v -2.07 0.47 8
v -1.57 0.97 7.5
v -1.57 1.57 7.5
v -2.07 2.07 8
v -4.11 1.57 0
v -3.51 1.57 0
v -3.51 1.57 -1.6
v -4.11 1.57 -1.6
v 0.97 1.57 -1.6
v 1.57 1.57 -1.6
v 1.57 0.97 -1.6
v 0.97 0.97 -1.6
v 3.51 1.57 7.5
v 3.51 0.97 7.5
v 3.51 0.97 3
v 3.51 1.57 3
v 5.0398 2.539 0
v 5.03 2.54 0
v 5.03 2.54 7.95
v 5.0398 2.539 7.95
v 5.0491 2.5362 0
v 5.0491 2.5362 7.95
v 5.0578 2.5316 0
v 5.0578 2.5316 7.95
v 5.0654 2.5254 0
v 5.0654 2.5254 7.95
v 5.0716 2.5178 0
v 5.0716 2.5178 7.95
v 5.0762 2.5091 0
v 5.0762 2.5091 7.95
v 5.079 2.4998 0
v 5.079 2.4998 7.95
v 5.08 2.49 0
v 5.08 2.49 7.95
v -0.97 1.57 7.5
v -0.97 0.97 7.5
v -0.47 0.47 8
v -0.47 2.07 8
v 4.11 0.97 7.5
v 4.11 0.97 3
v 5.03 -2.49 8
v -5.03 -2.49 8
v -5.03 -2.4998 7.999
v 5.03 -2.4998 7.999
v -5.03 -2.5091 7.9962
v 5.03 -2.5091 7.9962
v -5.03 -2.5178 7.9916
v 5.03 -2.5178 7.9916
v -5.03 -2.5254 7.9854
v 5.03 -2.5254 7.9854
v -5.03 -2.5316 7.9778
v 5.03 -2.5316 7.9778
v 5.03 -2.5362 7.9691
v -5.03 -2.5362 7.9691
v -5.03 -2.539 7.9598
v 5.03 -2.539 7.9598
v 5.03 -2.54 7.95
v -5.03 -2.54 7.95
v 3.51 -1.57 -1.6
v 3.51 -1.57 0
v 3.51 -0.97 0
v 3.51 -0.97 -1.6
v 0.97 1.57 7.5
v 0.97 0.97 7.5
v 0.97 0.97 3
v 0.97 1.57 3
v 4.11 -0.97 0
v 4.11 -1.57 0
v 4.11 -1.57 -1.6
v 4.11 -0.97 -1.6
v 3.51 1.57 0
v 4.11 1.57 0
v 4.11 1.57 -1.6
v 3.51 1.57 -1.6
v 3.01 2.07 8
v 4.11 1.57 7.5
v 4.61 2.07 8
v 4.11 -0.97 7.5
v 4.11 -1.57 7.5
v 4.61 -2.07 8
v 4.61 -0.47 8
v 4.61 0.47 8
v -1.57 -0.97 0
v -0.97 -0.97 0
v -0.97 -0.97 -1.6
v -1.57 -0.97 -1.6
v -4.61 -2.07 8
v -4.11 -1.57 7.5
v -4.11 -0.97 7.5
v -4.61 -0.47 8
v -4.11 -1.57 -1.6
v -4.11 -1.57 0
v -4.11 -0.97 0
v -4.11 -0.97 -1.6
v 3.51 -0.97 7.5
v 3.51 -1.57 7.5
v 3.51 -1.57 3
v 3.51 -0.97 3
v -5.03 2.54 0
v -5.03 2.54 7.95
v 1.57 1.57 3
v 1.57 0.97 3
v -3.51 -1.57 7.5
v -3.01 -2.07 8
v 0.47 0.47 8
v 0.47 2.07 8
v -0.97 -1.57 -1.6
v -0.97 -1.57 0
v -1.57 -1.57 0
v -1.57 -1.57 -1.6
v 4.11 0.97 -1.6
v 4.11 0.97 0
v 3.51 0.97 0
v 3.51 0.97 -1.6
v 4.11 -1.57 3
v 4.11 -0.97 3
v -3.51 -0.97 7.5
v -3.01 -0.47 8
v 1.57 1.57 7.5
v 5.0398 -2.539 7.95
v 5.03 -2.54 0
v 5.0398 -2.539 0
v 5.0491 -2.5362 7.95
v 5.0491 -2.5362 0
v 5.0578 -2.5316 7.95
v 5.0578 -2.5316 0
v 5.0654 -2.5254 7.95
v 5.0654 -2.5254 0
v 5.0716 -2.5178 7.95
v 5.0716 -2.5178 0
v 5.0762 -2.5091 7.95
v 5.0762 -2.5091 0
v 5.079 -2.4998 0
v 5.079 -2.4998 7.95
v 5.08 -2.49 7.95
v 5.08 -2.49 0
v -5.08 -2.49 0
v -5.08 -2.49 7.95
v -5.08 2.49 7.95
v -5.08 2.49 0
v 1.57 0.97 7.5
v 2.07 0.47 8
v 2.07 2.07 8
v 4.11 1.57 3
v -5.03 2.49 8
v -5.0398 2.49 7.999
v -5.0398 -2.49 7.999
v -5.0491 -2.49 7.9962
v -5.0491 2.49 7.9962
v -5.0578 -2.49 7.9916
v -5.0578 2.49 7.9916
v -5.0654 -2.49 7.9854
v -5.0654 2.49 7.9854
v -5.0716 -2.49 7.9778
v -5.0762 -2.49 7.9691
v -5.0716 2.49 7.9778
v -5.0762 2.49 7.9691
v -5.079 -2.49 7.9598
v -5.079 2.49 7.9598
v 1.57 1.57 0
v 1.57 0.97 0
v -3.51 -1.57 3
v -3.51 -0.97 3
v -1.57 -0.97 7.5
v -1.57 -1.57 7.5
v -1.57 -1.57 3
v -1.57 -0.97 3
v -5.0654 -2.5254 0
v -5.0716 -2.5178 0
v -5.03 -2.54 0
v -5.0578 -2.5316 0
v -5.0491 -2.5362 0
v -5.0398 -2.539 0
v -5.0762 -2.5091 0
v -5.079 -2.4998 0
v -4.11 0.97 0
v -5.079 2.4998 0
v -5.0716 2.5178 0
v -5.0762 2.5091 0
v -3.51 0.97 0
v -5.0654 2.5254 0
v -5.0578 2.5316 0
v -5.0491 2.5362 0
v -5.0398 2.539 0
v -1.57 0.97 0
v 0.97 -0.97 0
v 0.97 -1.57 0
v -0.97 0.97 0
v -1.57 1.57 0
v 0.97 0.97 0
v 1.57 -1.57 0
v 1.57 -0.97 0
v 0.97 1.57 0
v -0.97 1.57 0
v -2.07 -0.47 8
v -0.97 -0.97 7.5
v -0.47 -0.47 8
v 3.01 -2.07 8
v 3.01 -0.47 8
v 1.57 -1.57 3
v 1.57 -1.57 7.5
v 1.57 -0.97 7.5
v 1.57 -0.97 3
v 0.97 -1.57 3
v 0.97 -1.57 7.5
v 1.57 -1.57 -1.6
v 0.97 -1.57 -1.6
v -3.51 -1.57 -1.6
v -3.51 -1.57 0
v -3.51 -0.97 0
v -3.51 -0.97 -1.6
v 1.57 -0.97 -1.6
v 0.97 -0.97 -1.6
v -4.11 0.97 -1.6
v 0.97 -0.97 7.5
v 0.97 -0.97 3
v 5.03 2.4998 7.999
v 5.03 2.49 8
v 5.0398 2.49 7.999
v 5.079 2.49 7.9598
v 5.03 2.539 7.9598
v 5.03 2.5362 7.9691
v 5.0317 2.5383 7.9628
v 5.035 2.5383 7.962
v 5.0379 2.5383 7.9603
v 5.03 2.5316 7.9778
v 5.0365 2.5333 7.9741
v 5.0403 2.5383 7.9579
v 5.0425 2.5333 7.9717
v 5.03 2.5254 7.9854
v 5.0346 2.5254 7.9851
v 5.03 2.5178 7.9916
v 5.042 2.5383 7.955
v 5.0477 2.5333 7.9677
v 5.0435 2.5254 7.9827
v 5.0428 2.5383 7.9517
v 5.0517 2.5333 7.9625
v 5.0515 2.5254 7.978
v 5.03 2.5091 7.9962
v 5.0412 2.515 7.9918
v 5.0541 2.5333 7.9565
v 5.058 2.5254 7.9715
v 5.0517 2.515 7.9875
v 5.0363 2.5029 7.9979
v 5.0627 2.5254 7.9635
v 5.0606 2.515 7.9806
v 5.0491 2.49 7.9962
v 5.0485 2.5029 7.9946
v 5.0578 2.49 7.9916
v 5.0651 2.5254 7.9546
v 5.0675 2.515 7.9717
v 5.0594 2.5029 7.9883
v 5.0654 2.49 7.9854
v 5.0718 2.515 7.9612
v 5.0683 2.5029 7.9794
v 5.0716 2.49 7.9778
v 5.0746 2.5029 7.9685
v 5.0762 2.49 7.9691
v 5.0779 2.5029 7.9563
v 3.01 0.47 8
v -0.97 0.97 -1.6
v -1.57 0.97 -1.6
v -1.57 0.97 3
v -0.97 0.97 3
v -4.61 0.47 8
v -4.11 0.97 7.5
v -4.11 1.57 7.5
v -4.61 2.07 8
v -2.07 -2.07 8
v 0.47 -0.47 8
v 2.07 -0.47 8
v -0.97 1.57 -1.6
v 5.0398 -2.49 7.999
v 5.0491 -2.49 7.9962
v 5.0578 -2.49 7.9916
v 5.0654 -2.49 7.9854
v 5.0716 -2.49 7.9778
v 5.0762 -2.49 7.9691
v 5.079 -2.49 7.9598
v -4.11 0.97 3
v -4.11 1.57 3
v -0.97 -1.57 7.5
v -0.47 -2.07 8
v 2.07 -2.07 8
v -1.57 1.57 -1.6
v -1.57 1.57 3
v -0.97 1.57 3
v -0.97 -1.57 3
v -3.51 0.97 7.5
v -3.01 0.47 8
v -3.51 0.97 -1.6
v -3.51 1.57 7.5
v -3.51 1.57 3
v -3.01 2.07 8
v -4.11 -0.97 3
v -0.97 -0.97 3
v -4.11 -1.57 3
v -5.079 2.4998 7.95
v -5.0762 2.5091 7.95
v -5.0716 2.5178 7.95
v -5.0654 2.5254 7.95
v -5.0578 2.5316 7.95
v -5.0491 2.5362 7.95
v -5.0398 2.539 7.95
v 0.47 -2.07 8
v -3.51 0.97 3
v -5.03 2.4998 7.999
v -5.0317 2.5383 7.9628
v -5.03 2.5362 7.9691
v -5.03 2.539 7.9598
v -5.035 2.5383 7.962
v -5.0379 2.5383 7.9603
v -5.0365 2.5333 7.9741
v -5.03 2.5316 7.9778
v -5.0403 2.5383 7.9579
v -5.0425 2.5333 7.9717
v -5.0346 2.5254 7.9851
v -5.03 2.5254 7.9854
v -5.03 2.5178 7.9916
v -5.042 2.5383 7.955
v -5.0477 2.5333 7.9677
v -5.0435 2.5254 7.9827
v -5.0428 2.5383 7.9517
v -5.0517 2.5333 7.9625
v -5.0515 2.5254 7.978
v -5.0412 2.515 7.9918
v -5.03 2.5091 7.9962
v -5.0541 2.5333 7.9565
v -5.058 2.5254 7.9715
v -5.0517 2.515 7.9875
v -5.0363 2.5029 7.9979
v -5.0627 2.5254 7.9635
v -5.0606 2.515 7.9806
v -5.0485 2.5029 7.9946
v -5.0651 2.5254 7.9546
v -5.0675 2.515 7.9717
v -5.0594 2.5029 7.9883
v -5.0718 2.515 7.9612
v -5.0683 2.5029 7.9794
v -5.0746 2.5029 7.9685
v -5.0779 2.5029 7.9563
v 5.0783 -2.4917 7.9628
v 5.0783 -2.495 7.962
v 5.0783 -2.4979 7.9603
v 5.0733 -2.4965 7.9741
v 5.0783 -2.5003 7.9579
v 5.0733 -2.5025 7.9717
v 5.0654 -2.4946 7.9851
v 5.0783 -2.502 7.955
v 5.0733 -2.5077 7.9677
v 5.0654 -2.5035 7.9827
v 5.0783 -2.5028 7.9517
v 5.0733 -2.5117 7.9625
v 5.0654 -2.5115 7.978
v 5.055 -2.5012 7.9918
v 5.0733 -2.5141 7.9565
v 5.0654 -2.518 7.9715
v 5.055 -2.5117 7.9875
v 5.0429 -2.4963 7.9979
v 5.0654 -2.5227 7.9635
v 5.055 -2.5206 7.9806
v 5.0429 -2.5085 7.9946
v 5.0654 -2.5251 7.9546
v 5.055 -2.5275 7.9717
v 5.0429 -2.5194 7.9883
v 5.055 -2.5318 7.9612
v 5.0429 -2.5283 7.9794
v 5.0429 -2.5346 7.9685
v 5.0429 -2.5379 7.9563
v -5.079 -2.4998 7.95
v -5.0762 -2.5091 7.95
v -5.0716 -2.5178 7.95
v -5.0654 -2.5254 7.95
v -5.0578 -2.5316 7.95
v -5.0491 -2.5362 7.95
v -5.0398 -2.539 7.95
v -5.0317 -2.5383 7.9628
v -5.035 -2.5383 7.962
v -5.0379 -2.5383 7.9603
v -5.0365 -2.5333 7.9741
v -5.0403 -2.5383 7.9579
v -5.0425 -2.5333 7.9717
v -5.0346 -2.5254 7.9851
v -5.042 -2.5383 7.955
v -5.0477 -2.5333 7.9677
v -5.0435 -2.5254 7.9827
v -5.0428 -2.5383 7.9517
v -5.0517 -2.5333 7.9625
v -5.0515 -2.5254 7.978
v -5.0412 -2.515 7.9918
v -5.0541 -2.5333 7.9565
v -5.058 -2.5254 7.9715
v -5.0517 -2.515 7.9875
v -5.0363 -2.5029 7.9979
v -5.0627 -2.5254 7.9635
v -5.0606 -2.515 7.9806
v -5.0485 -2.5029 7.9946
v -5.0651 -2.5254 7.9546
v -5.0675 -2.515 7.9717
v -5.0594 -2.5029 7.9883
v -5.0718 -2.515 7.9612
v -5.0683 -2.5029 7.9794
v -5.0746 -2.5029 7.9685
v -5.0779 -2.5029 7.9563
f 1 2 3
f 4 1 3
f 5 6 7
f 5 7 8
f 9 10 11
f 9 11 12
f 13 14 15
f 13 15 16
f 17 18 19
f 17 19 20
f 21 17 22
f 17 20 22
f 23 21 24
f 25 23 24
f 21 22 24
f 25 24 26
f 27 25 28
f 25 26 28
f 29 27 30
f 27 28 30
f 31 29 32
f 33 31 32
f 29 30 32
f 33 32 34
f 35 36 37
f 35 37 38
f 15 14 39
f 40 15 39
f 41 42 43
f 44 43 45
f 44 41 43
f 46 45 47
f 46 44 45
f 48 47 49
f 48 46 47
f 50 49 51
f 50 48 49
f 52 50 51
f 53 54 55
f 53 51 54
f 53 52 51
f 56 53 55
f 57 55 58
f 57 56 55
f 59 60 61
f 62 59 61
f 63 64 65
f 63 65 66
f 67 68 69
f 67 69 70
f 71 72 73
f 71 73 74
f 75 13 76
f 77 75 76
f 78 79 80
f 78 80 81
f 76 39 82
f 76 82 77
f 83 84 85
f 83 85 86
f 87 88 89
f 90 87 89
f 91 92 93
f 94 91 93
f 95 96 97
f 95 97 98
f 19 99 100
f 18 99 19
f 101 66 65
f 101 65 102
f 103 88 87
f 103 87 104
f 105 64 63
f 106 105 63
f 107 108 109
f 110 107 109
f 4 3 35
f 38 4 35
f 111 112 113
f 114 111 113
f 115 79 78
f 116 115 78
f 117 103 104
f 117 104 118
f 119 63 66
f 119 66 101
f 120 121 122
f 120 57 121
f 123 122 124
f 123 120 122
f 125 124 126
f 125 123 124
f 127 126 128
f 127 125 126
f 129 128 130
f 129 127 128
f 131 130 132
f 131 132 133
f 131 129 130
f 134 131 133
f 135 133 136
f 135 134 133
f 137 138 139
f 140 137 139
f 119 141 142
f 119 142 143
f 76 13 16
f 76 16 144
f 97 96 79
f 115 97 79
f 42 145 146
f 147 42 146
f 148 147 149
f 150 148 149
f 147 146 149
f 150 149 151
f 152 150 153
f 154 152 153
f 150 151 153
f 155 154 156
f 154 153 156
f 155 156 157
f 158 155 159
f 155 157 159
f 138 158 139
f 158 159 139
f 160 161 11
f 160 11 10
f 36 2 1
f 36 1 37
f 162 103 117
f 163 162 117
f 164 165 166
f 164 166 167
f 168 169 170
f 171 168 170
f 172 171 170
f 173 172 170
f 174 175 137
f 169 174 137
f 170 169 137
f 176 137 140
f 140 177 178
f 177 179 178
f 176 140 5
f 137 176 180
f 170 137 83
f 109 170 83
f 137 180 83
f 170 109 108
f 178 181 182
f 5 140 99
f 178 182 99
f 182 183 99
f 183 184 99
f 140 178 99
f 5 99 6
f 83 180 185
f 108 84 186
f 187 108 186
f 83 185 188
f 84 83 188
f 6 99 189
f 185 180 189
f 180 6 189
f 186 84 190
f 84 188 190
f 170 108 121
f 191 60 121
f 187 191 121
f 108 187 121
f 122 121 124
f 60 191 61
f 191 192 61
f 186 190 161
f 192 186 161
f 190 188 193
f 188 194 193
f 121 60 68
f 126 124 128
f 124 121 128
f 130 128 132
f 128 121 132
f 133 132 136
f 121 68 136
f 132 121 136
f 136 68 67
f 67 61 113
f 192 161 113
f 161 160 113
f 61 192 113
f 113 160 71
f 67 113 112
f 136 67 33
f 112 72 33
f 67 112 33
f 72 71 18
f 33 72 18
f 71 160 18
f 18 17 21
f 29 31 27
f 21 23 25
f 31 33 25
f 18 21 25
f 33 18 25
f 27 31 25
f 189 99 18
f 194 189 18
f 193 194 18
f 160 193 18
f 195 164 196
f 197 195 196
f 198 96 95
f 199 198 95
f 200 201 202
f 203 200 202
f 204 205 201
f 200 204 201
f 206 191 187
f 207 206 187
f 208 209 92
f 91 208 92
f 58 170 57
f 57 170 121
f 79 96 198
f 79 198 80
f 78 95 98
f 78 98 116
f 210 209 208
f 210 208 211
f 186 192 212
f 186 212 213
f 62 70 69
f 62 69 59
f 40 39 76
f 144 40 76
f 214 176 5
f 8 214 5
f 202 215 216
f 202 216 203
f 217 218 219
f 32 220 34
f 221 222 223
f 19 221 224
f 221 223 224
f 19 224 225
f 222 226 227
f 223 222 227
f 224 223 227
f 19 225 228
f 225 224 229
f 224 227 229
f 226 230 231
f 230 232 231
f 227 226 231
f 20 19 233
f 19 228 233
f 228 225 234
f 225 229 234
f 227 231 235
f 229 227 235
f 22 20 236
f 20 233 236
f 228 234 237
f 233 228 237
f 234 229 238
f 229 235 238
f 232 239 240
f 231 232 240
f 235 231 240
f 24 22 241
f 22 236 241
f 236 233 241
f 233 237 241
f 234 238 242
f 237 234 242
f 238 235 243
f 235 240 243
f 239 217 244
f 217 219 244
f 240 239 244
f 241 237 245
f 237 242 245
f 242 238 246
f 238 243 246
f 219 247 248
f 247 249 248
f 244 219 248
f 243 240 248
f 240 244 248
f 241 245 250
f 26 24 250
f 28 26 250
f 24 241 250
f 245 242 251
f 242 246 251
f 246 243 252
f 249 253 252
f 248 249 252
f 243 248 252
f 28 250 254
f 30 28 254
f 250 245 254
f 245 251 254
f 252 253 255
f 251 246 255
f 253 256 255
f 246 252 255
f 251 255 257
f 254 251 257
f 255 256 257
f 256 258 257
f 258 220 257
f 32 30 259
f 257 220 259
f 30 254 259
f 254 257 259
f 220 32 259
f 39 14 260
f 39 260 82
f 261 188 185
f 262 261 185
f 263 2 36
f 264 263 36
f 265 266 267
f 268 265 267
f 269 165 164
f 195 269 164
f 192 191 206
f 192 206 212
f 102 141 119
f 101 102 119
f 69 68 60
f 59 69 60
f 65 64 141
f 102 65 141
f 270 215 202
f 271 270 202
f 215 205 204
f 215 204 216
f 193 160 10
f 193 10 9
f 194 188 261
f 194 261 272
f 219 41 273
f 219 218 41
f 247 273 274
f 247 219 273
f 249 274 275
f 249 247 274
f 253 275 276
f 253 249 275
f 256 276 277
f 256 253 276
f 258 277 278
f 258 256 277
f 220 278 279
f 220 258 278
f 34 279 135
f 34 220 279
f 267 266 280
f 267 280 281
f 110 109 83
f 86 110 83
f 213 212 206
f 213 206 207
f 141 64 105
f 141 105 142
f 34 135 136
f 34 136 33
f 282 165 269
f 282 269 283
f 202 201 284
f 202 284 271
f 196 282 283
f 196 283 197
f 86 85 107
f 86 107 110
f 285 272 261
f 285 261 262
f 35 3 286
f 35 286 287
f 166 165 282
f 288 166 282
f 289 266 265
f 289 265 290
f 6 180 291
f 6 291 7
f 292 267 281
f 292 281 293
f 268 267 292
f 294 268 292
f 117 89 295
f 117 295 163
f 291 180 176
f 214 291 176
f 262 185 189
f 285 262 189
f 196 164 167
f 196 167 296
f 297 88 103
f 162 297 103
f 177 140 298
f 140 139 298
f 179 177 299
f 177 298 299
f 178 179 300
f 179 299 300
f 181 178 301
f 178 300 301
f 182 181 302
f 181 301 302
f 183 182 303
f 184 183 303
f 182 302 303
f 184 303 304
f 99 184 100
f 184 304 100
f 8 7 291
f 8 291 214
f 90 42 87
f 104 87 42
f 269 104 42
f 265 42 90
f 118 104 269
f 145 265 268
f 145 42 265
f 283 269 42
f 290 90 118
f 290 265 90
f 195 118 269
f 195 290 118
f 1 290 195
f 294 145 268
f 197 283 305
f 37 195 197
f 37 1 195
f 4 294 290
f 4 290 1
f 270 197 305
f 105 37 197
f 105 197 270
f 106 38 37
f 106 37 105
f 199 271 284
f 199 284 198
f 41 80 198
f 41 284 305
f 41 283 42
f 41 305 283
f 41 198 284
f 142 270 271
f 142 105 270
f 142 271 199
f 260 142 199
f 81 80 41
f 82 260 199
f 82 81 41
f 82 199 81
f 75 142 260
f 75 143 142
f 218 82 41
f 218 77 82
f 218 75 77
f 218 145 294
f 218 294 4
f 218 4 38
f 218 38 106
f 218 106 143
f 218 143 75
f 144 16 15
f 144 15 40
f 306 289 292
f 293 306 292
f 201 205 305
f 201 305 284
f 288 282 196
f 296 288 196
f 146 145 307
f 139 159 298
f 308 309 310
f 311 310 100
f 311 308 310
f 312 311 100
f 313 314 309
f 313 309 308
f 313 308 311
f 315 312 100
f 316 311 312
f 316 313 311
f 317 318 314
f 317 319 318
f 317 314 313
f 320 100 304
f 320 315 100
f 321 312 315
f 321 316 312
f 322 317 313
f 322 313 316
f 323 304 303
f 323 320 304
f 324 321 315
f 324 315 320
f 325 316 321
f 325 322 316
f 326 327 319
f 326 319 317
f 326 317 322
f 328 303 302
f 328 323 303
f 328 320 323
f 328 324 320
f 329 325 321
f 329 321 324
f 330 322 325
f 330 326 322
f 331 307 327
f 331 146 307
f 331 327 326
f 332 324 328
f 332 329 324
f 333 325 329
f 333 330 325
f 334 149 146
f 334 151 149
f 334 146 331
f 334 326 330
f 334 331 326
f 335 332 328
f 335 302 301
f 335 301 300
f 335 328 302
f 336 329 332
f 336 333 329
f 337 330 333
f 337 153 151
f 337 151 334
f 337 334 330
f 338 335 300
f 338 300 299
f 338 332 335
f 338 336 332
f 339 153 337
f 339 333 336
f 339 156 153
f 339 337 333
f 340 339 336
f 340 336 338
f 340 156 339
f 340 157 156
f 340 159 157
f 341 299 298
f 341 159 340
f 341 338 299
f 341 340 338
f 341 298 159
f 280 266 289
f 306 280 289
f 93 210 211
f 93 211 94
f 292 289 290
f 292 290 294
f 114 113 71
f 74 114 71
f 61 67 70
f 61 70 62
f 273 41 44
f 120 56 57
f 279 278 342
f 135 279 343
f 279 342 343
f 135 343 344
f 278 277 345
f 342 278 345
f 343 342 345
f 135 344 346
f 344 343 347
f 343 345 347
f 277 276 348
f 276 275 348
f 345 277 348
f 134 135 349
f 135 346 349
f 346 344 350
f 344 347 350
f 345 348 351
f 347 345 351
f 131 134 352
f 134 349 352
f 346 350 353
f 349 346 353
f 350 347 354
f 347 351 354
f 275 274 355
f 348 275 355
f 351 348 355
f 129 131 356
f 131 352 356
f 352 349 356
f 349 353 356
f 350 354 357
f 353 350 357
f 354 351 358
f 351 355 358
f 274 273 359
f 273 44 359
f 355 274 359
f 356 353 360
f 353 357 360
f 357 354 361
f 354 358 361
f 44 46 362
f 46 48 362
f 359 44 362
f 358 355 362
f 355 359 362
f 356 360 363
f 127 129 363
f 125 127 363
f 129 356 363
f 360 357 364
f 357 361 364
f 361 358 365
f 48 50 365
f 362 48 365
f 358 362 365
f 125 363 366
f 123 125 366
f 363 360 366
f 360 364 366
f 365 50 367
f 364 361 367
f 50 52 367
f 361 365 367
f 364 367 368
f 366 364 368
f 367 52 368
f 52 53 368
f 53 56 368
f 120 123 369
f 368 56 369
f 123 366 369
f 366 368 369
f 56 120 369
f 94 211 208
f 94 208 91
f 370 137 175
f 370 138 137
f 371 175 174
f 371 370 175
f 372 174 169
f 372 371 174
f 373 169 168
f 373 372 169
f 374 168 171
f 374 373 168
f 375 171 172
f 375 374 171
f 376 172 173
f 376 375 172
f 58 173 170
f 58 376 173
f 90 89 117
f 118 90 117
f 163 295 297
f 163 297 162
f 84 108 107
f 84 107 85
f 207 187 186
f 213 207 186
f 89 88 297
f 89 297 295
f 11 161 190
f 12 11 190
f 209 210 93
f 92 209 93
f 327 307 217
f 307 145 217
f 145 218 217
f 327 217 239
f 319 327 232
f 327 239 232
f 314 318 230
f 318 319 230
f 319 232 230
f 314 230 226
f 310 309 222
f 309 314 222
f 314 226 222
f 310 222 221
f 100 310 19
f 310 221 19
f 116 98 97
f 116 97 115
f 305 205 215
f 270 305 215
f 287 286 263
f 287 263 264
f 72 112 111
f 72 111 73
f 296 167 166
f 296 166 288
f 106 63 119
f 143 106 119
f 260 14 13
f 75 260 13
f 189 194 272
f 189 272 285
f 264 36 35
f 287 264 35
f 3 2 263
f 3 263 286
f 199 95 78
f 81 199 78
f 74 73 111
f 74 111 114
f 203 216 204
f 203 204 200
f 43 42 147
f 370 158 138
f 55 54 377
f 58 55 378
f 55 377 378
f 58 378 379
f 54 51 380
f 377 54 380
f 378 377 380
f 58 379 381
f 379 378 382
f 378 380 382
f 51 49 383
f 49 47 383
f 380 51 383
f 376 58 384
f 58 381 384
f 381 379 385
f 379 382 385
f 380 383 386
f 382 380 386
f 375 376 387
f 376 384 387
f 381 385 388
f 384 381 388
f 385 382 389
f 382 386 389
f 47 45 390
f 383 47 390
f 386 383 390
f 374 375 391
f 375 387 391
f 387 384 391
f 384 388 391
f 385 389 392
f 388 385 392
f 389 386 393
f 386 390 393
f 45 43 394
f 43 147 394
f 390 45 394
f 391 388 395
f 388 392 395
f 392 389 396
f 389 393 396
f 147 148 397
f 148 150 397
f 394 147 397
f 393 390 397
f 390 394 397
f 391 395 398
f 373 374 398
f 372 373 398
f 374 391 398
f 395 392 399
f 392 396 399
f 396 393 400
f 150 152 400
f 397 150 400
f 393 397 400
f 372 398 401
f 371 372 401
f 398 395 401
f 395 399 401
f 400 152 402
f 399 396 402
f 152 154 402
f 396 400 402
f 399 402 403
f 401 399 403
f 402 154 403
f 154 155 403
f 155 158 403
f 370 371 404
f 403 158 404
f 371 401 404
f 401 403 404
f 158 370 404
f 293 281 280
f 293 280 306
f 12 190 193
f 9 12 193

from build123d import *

# Parameters (mm, degrees)
SKETCH_1_W                  = 10.16
SKETCH_1_H                  = 5.08
EXTRUDE_1_DEPTH             = 8
SKETCH_2_W                  = 0.6
SKETCH_2_H                  = 0.6
CUT_EXTRUDE_1_DEPTH         = 5
SKETCH_3_W                  = 0.6
SKETCH_3_H                  = 0.6
EXTRUDE_2_DEPTH             = 1.6
PATTERN_LINEAR_1_COUNT      = 4
PATTERN_LINEAR_1_PITCH      = 2.54
PATTERN_LINEAR_1_COUNT_DIR2 = 2
PATTERN_LINEAR_1_PITCH_DIR2 = 2.54
CHAMFER_1_SIZE              = 0.5
CHAMFER_2_SIZE              = 0.5
FILLET_1_R                  = 0.05


with BuildPart() as part:
    # 草图1 → 凸台-拉伸1 (new body)
    with BuildSketch(Plane.XY):
        Rectangle(SKETCH_1_W, SKETCH_1_H)
    extrude(amount=EXTRUDE_1_DEPTH)

    # 草图2 → 切除-拉伸1 (cut)
    with BuildSketch(Plane.XY.offset(8)):
        with Locations((1.27, 1.27)):
            Rectangle(SKETCH_2_W, SKETCH_2_H)
        with Locations((-1.27, 1.27)):
            Rectangle(SKETCH_2_W, SKETCH_2_H)
        with Locations((3.81, 1.27)):
            Rectangle(SKETCH_2_W, SKETCH_2_H)
        with Locations((-1.27, -1.27)):
            Rectangle(SKETCH_2_W, SKETCH_2_H)
        with Locations((1.27, -1.27)):
            Rectangle(SKETCH_2_W, SKETCH_2_H)
        with Locations((3.81, -1.27)):
            Rectangle(SKETCH_2_W, SKETCH_2_H)
        with Locations((-3.81, -1.27)):
            Rectangle(SKETCH_2_W, SKETCH_2_H)
        with Locations((-3.81, 1.27)):
            Rectangle(SKETCH_2_W, SKETCH_2_H)
    extrude(amount=-CUT_EXTRUDE_1_DEPTH, mode=Mode.SUBTRACT)


with BuildPart() as body_2:
    # 草图3 → 凸台-拉伸2 (new body)
    with BuildSketch(Plane(origin=(0, 0, 0), x_dir=(-1, 0, 0), z_dir=(0, 0, -1))):
        with Locations((3.81, -1.27)):
            Rectangle(SKETCH_3_W, SKETCH_3_H)
    extrude_2 = extrude(amount=EXTRUDE_2_DEPTH)


with BuildPart() as part_1:
    add(part.part)

    # 阵列(线性)1: Extrude 2 4 × 2
    with Locations(*[(i * PATTERN_LINEAR_1_PITCH, j * PATTERN_LINEAR_1_PITCH_DIR2, 0) for i in range(PATTERN_LINEAR_1_COUNT) for j in range(PATTERN_LINEAR_1_COUNT_DIR2) if (i, j) != (0, 0)]):
        add(extrude_2)

    # 倒角1
    chamfer_1_edges = [part_1.edges().sort_by_distance(p)[0] for p in [
        (4.11, -1.27, 8),
        (3.81, -0.97, 8),
        (3.51, -1.27, 8),
        (3.81, -1.57, 8),
    ]]
    chamfer(chamfer_1_edges, length=CHAMFER_1_SIZE)

    # 倒角2
    chamfer_2_edges = [part_1.edges().sort_by_distance(p)[0] for p in [
        (-0.97, 1.27, 8),
        (-1.27, 1.57, 8),
        (-1.57, 1.27, 8),
        (-1.27, 0.97, 8),
        (1.57, 1.27, 8),
        (1.27, 1.57, 8),
        (0.97, 1.27, 8),
        (1.27, 0.97, 8),
        (-3.81, -0.97, 8),
        (-4.11, -1.27, 8),
        (-3.81, -1.57, 8),
        (-3.51, -1.27, 8),
        (4.11, 1.27, 8),
        (3.81, 1.57, 8),
        (3.51, 1.27, 8),
        (3.81, 0.97, 8),
        (-0.97, -1.27, 8),
        (-1.27, -0.97, 8),
        (-1.57, -1.27, 8),
        (-1.27, -1.57, 8),
        (1.57, -1.27, 8),
        (1.27, -0.97, 8),
        (0.97, -1.27, 8),
        (1.27, -1.57, 8),
        (-3.81, 1.57, 8),
        (-4.11, 1.27, 8),
        (-3.81, 0.97, 8),
        (-3.51, 1.27, 8),
    ]]
    chamfer(chamfer_2_edges, length=CHAMFER_2_SIZE)

    # 圆角1
    fillet_1_edges = [part_1.edges().sort_by_distance(p)[0] for p in [
        (-5.08, 0, 8),
        (0, -2.54, 8),
        (5.08, 0, 8),
        (0, 2.54, 8),
        (5.08, -2.54, 4),
        (-5.08, -2.54, 4),
        (-5.08, 2.54, 4),
        (5.08, 2.54, 4),
    ]]
    fillet(fillet_1_edges, radius=FILLET_1_R)


solid = Compound([body_2.part, part_1.part])
